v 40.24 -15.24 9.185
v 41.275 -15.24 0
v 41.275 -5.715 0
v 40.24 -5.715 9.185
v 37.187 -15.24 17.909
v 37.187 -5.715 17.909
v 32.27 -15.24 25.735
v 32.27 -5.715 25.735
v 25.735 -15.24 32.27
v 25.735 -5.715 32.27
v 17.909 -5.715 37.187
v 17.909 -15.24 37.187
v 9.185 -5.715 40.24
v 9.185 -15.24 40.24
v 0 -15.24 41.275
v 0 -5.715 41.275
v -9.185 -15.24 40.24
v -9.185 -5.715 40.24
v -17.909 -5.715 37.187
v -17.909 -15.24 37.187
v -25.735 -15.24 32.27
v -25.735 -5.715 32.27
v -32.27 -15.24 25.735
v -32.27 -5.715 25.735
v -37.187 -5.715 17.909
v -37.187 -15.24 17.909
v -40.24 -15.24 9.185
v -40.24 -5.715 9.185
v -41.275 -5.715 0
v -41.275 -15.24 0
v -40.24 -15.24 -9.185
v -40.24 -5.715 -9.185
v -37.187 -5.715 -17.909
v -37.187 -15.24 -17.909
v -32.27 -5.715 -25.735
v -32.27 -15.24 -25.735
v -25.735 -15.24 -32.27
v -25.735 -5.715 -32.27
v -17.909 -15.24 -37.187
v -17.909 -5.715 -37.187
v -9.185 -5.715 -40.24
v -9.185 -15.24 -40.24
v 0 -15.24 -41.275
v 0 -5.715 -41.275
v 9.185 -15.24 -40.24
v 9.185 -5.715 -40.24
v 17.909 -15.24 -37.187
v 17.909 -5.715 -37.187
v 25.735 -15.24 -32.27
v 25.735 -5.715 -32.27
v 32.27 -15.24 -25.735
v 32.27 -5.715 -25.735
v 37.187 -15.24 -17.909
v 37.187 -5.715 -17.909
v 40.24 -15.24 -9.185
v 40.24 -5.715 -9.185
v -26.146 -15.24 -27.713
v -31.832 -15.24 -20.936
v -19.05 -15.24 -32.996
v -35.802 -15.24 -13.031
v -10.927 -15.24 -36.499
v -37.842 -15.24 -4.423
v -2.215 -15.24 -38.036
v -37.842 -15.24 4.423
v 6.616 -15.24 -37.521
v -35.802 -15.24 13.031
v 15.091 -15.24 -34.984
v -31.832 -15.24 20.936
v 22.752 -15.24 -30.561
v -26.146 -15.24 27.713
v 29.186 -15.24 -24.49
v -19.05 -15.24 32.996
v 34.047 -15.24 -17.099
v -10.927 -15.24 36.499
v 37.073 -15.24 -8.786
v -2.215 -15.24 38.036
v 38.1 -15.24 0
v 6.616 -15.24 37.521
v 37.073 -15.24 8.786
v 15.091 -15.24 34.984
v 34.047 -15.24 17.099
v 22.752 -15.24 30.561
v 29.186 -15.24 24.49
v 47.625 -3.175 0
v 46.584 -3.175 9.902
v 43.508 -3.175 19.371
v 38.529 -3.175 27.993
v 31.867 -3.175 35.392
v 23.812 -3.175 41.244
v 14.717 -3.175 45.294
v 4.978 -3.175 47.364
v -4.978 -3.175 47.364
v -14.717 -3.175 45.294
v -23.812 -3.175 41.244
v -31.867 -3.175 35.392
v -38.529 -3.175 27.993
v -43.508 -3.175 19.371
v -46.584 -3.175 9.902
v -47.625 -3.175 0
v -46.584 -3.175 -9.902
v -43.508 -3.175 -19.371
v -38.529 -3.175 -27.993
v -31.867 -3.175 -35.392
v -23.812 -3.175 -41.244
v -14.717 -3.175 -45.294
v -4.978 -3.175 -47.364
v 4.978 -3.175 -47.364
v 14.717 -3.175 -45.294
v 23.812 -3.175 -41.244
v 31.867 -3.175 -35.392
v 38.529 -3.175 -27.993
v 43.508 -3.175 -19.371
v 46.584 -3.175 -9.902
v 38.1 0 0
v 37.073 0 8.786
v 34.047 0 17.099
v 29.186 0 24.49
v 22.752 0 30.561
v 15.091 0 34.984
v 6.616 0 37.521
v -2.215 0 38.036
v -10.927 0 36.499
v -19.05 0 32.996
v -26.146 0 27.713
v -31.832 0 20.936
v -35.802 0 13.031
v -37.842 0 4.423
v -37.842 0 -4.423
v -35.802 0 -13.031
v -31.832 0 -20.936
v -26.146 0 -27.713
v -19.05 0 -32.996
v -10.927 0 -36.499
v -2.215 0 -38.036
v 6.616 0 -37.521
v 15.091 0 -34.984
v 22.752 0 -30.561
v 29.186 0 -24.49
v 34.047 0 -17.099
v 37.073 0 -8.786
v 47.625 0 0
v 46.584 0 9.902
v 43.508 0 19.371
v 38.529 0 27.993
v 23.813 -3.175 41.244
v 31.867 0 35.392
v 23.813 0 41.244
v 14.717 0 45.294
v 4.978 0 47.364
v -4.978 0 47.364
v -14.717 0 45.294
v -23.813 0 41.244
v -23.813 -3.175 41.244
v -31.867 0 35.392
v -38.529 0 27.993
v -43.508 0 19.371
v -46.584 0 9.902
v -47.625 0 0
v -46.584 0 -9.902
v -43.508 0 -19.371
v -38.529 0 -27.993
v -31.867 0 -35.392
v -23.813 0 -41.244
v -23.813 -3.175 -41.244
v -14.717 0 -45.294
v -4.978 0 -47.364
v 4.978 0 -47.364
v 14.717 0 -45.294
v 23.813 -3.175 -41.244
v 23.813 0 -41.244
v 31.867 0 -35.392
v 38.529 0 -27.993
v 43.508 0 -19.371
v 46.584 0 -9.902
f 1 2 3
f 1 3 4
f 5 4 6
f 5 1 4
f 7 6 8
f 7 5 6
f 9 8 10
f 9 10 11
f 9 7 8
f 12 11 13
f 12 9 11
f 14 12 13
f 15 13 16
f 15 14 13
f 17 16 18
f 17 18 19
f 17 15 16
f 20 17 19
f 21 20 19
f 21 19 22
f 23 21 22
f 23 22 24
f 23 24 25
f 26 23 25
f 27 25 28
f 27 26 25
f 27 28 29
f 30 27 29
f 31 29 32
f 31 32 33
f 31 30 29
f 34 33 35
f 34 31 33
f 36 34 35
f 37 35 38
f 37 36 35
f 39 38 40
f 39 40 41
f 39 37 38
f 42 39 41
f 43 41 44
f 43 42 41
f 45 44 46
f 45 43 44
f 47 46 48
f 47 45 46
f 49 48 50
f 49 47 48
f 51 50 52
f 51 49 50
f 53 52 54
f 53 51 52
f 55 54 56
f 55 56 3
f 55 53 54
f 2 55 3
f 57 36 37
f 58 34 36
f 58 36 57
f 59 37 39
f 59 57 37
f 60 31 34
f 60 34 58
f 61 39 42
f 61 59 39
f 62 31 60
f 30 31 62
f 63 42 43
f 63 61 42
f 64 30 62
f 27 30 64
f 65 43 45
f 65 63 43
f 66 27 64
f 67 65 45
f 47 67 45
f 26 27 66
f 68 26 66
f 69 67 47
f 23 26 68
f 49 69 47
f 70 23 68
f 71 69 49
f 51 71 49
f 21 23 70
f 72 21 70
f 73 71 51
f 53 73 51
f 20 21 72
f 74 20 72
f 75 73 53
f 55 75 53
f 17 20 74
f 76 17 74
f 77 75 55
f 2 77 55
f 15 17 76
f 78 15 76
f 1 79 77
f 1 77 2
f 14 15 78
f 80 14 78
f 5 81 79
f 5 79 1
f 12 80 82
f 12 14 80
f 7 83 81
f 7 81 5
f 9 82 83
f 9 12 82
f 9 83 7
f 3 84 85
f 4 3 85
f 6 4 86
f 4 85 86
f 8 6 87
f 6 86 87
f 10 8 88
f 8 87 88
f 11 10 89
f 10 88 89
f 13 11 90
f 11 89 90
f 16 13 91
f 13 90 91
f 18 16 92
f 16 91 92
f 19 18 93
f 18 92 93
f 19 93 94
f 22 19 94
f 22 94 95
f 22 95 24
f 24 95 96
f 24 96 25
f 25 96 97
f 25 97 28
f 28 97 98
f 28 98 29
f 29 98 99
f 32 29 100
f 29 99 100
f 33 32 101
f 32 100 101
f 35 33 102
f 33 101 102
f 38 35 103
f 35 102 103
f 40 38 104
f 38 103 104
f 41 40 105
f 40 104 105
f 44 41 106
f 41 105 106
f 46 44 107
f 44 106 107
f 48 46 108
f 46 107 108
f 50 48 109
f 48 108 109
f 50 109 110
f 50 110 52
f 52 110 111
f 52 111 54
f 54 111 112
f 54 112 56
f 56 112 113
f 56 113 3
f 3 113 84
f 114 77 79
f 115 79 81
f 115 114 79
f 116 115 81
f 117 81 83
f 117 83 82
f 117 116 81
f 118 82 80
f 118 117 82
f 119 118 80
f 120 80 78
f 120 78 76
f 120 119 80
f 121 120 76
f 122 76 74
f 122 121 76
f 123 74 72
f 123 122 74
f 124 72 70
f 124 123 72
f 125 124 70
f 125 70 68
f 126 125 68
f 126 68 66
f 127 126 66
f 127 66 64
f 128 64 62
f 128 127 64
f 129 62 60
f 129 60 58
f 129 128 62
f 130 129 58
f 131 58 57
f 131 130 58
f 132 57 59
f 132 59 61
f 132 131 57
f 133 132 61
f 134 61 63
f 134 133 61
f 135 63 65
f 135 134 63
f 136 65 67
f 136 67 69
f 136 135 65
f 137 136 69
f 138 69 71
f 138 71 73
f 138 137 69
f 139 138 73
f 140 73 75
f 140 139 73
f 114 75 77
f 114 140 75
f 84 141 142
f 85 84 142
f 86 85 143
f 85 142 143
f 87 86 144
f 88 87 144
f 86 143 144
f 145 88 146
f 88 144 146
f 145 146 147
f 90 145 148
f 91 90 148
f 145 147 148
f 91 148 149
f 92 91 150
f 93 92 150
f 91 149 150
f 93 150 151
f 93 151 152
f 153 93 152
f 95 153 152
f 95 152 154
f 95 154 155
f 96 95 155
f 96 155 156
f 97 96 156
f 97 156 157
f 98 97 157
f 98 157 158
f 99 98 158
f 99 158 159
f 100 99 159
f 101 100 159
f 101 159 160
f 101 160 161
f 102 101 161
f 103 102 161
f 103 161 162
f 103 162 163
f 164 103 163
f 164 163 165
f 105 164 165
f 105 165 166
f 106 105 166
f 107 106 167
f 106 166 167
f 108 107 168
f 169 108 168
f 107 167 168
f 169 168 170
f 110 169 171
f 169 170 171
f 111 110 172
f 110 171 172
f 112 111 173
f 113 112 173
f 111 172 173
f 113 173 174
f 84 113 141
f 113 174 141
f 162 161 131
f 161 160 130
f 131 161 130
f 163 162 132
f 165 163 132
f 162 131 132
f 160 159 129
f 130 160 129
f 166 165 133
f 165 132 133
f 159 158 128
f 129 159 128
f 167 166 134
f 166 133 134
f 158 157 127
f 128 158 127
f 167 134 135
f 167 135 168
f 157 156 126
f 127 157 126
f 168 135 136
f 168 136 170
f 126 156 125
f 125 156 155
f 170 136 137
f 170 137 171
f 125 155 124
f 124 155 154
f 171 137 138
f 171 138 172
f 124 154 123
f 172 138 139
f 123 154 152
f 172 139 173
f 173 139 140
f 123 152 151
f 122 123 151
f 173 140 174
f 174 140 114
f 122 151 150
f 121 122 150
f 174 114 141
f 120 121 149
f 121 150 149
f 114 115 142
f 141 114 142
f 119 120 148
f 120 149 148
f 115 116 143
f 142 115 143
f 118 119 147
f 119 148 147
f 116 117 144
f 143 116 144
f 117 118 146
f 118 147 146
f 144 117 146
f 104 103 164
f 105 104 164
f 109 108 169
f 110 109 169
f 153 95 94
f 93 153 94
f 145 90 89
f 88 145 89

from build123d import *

# Parameters (mm, degrees)
F0_R     = 47.625
F0_R_2   = 38.1
F1_DEPTH = 15.24
F2_R     = 47.625
F2_R_2   = 41.275
F3_DEPTH = 12.065
F4_SIZE2 = 6.34999
F4_SIZE  = 2.53999


# Not quite as in the source:
# - a fillet or chamfer is up to 0.001 mm smaller than in the source, because OpenCascade refuses the exact size


with BuildPart() as f1:
    # F0 (on Front) → F1 (new body)
    with BuildSketch(Plane.XZ):
        Circle(F0_R)
        Circle(F0_R_2, mode=Mode.SUBTRACT)
    extrude(amount=F1_DEPTH)

    # F2 (on face) → F3 (cut)
    with BuildSketch(Plane.XZ.offset(15.24)):
        Circle(F2_R)
        Circle(F2_R_2, mode=Mode.SUBTRACT)
    extrude(amount=-F3_DEPTH, mode=Mode.SUBTRACT)

    # F4 (size 2.54 and 6.35 in the source; OpenCascade refuses exactly that, so slightly less here)
    f4_edges = [f1.edges().sort_by_distance(p)[0] for p in [
        (-41.275, -3.175, 0),
    ]]
    f4_side = f1.faces().sort_by_distance((-41.275, -9.2075, 0))[0]
    chamfer(f4_edges, length=F4_SIZE, length2=F4_SIZE2, reference=f4_side)


solid = f1.part
